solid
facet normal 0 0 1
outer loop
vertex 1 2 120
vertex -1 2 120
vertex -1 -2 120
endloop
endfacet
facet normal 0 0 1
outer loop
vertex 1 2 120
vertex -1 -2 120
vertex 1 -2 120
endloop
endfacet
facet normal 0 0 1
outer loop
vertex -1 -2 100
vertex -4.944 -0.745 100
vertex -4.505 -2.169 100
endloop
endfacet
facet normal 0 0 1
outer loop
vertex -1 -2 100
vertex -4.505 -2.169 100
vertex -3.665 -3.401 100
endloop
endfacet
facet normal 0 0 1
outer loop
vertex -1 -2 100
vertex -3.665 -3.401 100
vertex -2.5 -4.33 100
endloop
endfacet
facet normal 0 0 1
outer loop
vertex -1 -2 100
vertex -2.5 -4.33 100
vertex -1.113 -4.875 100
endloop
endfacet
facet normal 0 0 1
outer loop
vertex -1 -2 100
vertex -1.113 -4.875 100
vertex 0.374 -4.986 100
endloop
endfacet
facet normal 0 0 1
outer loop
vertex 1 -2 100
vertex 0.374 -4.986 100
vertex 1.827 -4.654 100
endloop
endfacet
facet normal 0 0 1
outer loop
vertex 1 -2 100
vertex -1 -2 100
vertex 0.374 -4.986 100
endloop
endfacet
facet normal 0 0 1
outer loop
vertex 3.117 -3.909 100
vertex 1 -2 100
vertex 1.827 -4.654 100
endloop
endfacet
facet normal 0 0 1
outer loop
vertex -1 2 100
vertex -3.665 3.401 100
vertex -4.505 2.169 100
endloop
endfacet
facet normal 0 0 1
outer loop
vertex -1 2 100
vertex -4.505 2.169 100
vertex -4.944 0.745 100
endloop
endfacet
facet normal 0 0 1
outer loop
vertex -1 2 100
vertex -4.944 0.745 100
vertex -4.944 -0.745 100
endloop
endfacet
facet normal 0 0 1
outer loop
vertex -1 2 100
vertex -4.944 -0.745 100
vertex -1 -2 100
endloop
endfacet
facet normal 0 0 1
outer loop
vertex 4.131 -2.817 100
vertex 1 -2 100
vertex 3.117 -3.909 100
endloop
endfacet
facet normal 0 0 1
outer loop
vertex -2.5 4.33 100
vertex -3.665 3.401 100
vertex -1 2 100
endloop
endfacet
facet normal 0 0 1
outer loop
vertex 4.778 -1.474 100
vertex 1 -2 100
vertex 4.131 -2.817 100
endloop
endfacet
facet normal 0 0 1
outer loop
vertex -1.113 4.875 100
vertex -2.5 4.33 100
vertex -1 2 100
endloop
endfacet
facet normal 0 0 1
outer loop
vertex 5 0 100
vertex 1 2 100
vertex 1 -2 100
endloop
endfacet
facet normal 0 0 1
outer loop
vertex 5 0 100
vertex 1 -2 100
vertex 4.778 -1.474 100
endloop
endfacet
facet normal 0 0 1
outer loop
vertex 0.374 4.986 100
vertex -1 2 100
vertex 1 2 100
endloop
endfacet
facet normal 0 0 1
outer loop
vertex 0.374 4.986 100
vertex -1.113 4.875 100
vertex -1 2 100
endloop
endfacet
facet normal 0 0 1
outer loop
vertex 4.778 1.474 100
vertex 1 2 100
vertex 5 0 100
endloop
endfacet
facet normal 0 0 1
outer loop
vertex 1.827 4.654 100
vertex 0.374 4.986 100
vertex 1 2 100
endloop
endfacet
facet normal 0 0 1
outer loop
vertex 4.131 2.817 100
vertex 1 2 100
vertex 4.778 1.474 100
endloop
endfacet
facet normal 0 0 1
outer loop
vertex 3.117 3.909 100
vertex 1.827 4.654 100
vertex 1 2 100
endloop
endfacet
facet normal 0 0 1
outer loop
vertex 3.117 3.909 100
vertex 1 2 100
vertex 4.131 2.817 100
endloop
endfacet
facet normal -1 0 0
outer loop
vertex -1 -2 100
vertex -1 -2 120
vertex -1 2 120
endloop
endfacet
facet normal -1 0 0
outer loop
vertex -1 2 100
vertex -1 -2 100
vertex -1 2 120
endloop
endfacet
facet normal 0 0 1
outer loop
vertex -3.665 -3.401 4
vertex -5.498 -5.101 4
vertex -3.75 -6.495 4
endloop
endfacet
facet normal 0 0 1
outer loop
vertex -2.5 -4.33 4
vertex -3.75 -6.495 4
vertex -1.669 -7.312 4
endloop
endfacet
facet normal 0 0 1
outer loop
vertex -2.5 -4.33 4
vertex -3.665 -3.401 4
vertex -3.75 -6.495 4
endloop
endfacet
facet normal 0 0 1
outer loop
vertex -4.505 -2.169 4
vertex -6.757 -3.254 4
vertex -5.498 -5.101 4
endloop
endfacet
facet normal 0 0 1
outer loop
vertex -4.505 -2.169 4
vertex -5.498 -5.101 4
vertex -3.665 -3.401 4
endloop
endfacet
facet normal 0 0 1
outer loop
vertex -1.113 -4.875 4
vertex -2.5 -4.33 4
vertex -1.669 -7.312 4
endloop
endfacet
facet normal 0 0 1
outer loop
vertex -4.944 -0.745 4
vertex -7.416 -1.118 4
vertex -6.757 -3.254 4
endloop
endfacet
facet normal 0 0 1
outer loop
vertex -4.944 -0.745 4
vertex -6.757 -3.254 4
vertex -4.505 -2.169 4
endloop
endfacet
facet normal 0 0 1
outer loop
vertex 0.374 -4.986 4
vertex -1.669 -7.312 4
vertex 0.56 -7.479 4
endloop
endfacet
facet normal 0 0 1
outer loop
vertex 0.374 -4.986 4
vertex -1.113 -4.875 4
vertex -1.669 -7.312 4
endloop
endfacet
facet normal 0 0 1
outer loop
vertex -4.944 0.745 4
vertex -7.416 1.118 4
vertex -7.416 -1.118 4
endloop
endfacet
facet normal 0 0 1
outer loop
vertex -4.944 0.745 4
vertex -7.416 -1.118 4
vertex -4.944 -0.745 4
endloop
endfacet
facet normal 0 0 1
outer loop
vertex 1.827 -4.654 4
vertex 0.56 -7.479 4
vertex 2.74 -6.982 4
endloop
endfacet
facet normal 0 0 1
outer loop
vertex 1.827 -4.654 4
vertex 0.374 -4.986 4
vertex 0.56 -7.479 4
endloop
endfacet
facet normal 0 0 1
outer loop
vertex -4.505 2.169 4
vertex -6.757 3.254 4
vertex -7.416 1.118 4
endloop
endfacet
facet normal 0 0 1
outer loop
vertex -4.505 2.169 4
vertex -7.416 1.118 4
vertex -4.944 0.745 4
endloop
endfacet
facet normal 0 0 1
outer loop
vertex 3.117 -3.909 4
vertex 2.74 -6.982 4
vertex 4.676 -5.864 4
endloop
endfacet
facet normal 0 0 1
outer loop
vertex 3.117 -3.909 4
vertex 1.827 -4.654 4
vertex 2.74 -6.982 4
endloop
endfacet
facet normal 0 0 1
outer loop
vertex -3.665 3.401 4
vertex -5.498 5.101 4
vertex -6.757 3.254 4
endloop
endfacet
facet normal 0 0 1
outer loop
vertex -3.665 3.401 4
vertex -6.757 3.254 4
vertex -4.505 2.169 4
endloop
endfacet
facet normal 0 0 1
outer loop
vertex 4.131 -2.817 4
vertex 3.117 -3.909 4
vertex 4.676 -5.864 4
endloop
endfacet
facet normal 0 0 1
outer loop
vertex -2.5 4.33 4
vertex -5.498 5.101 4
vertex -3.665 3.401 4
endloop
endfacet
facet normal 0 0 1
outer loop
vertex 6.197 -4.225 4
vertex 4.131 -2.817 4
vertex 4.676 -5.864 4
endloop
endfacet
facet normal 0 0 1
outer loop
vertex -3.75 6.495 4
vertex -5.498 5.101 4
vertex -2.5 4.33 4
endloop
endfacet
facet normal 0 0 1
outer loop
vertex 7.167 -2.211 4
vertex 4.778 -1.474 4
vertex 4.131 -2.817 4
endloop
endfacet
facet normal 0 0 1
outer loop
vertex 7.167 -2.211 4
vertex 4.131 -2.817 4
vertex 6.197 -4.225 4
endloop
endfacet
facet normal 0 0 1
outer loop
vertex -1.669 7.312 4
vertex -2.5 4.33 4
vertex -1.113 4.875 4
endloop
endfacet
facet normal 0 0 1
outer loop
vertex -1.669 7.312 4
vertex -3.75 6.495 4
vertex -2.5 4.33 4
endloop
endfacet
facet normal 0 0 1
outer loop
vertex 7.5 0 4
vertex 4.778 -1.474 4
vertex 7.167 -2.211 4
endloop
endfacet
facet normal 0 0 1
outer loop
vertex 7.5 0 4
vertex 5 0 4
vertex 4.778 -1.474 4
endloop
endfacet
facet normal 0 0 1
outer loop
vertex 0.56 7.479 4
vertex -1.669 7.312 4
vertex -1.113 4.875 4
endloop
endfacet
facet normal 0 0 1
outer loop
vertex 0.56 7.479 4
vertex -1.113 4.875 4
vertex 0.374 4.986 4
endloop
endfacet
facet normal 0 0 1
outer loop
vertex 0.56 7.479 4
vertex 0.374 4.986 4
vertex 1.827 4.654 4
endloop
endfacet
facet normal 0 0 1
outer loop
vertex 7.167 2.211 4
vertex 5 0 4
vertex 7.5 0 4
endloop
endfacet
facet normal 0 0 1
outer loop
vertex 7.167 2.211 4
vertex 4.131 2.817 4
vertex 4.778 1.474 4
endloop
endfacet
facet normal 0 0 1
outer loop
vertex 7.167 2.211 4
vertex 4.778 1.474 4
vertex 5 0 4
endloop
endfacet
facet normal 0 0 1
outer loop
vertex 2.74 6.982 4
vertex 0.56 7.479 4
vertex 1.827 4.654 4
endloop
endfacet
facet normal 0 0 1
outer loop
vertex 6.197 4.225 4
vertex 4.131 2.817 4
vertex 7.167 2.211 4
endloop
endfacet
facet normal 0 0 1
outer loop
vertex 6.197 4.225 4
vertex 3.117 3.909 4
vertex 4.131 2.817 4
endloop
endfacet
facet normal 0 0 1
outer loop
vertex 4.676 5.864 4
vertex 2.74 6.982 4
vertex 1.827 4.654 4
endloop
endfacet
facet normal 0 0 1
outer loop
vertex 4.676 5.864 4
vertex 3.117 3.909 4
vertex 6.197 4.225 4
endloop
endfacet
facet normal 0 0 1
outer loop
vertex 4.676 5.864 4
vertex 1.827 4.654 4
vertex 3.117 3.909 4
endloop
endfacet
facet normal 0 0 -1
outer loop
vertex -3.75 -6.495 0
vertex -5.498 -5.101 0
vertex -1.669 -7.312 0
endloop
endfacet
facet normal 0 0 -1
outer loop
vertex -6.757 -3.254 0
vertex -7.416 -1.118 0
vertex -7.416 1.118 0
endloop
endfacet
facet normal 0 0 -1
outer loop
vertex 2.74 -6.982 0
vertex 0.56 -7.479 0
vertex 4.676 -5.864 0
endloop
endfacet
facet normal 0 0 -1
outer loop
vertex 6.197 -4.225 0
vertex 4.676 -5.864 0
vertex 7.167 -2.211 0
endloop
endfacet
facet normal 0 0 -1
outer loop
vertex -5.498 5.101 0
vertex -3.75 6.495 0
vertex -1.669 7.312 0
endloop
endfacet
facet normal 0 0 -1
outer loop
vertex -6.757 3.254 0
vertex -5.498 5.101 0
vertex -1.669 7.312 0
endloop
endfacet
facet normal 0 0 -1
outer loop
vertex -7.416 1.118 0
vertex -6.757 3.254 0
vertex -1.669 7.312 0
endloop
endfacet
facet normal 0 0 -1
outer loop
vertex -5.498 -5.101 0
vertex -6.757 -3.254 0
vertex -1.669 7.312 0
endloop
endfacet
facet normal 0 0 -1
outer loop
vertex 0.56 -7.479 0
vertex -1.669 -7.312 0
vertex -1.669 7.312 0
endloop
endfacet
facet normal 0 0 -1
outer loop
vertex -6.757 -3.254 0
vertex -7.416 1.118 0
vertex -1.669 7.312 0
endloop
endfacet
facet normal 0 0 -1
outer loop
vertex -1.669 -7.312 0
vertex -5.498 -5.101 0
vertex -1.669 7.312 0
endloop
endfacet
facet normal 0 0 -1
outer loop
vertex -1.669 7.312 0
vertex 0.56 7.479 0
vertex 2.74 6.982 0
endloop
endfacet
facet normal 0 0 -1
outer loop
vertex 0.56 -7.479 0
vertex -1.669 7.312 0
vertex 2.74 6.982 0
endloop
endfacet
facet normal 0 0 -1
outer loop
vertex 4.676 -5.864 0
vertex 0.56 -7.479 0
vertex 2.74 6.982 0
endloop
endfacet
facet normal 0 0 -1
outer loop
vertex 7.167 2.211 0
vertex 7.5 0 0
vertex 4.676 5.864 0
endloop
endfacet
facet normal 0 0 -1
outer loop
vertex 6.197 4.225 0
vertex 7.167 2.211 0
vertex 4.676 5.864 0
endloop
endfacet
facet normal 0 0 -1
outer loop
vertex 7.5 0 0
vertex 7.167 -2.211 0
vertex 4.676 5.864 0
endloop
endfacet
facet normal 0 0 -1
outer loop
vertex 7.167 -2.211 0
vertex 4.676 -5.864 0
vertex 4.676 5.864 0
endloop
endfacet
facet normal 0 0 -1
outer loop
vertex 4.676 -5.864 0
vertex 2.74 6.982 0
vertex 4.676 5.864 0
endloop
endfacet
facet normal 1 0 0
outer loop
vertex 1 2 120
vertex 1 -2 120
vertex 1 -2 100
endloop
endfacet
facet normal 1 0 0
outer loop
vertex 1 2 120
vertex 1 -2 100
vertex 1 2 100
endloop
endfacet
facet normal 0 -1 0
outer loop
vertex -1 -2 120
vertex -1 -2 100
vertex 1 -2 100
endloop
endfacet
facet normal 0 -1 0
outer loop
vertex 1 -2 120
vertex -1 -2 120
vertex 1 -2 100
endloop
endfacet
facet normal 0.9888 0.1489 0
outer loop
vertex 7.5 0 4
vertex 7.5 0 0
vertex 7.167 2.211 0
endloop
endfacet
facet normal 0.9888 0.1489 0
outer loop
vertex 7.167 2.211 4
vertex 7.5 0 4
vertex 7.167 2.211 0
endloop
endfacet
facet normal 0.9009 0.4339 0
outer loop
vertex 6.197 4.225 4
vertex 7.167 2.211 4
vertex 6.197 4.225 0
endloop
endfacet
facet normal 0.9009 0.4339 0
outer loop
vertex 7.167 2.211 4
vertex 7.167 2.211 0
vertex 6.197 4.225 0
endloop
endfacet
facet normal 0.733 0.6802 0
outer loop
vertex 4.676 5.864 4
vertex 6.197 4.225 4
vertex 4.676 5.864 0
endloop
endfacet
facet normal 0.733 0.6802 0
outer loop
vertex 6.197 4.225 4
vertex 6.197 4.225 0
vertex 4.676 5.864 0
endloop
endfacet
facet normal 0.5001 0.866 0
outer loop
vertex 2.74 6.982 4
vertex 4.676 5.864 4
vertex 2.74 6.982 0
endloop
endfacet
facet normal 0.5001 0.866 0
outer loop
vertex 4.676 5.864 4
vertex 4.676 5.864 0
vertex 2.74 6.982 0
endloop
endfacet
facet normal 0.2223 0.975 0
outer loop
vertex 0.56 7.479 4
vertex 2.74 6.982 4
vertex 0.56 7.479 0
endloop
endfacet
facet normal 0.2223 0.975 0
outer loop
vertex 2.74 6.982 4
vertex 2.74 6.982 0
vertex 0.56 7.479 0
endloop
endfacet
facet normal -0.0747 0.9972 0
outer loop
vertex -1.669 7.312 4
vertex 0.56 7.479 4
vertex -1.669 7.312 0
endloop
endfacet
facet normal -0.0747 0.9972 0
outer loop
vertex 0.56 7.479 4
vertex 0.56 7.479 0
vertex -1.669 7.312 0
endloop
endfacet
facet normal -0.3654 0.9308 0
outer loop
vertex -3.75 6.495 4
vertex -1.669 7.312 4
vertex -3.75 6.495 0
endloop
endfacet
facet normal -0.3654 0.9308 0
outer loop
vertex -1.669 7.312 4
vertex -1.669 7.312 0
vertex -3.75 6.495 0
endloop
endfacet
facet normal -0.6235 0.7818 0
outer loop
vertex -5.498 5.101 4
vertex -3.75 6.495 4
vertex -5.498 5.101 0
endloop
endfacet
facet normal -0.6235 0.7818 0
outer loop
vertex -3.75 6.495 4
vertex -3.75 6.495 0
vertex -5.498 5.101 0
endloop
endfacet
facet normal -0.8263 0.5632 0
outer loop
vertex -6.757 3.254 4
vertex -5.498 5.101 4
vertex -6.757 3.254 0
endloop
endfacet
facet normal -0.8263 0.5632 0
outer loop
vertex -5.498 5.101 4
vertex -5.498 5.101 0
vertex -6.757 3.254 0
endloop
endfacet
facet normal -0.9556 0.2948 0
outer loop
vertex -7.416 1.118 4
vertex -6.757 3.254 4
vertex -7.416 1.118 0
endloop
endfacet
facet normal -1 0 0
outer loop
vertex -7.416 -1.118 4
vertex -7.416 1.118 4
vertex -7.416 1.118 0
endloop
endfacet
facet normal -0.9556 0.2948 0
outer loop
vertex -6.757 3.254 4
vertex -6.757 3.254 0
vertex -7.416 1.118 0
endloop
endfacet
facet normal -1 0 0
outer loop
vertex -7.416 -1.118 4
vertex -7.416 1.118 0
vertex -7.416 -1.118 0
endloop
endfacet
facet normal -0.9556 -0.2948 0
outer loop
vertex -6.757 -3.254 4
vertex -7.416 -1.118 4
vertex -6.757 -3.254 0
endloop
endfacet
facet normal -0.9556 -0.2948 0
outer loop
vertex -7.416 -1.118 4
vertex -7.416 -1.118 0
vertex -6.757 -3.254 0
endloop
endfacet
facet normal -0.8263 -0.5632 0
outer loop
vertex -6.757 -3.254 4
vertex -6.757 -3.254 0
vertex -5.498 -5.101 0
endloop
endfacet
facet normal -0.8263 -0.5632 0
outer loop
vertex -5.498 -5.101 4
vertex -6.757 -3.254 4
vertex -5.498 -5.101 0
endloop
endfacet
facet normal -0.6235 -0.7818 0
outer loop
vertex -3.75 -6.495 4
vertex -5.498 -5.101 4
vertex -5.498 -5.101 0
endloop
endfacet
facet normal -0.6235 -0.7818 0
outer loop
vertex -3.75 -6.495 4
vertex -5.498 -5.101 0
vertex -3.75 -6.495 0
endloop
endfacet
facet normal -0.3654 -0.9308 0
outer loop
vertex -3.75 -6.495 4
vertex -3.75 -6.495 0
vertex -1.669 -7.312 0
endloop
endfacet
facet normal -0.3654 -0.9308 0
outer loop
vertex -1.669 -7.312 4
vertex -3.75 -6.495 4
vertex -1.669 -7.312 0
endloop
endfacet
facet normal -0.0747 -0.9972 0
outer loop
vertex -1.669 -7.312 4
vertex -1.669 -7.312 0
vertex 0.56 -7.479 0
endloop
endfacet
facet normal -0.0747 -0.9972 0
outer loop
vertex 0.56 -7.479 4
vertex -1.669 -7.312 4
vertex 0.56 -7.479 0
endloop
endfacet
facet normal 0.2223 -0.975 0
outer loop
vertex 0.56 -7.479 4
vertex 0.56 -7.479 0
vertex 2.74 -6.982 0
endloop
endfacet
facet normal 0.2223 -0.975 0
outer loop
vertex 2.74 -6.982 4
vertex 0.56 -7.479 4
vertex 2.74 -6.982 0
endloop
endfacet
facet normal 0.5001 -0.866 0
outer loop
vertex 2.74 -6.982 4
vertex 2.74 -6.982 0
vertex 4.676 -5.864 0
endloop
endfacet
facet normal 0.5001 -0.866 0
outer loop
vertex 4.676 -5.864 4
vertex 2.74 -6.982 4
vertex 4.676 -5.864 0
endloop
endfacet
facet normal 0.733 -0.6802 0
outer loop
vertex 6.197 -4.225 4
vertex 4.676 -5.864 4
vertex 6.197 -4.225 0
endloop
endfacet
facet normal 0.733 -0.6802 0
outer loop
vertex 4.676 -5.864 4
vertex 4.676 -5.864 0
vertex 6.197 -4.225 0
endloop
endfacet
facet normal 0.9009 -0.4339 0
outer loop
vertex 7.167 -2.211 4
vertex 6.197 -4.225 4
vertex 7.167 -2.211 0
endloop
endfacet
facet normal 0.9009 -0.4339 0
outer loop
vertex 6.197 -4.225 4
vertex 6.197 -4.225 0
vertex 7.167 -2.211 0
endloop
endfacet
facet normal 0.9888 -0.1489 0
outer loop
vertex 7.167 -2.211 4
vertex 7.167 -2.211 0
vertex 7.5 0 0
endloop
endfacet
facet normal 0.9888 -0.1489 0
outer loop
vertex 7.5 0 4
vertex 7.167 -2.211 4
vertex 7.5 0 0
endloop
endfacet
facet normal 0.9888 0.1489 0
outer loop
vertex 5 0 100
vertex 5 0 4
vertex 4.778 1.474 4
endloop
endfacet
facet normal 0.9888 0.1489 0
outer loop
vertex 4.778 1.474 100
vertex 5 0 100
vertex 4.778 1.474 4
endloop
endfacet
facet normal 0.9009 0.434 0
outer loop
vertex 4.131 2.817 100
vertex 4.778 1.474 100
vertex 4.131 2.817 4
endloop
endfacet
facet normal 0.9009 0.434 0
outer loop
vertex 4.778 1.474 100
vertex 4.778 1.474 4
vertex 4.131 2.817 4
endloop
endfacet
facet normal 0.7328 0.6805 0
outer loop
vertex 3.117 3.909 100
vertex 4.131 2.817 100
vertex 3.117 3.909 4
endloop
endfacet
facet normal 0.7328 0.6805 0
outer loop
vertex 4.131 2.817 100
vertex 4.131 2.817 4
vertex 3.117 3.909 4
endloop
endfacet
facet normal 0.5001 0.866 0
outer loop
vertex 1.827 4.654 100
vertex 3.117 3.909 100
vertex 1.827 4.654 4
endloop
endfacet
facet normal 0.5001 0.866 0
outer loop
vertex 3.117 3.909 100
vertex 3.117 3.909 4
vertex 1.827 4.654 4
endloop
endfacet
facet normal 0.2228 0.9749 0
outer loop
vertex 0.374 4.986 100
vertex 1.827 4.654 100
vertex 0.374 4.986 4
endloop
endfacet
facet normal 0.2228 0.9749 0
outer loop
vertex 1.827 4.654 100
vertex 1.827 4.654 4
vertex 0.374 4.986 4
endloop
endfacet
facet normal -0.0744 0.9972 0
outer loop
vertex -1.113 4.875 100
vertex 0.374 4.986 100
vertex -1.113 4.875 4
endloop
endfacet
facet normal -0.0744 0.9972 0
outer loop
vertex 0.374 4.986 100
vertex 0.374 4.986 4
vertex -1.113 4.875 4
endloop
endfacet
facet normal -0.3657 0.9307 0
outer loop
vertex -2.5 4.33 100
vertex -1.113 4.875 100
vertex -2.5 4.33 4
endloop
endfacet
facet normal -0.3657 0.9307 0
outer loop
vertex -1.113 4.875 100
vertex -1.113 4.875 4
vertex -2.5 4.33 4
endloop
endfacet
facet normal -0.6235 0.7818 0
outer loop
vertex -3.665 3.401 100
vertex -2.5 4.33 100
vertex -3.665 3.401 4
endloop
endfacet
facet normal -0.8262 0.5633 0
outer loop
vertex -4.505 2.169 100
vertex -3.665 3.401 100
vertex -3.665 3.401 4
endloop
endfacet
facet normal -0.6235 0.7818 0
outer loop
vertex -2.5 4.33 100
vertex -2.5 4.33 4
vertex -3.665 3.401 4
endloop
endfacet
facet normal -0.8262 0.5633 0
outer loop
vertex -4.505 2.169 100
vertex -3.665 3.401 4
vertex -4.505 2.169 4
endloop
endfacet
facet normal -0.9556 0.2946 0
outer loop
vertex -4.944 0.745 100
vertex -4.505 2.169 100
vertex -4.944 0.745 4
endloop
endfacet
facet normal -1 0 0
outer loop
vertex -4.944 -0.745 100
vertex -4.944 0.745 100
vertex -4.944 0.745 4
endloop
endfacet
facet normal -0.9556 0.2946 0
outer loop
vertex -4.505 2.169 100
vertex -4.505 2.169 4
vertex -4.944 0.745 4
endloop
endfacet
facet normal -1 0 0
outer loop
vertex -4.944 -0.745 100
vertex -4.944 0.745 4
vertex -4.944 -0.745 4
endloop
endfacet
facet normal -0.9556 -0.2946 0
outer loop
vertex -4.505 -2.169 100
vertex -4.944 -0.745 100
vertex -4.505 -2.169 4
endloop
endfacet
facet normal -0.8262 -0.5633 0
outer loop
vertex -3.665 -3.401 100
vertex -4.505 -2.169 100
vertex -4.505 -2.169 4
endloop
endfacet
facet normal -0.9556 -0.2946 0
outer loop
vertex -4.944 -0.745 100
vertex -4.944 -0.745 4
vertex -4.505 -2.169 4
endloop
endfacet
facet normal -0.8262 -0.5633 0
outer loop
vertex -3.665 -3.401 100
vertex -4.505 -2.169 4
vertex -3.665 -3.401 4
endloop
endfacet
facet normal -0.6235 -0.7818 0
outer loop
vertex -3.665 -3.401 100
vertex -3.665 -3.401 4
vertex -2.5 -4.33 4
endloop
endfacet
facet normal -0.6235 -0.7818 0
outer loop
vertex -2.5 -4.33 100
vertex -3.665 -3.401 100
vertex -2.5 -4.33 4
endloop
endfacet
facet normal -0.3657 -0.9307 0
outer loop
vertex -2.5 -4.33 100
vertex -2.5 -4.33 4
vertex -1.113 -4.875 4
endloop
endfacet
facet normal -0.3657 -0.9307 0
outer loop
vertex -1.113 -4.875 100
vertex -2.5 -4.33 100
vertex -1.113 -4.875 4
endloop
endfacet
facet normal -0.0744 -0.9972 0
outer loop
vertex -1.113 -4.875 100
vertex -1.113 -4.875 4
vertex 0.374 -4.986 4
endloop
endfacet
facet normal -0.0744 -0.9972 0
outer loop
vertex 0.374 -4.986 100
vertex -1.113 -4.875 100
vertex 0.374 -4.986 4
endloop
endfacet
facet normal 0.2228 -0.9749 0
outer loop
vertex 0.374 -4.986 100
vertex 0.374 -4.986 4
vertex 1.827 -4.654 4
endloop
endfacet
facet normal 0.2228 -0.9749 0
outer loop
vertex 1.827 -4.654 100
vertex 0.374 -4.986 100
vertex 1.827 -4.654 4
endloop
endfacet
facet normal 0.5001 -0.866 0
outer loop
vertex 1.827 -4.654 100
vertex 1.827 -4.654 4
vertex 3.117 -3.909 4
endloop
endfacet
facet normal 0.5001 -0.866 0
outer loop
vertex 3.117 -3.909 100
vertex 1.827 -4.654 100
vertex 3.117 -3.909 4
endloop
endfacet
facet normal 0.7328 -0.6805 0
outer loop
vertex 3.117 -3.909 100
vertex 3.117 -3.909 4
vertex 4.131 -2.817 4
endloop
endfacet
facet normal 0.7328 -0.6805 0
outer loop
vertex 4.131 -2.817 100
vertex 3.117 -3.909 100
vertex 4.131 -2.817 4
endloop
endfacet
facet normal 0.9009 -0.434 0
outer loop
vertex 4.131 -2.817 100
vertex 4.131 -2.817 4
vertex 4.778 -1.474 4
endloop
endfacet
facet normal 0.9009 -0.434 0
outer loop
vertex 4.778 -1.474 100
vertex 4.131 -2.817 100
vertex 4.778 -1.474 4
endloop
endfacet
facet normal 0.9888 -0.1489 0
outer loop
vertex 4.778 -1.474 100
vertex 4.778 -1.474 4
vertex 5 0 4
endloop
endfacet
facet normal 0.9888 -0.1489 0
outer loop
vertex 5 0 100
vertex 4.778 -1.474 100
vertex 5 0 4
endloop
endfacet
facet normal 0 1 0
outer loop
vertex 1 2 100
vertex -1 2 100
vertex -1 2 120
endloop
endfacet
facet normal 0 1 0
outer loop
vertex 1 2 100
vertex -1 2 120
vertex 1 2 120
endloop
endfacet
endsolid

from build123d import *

# Parameters (mm, degrees)
F0_R     = 7.5
F1_DEPTH = 4
F2_R     = 5
F3_DEPTH = 100
F4_W     = 2
F4_H     = 4
F5_DEPTH = 20


with BuildPart() as f1:
    # F0 (on Top) → F1 (new body)
    with BuildSketch(Plane.XY):
        Circle(F0_R)
    extrude(amount=F1_DEPTH)

    # F2 (on Top) → F3 (join)
    with BuildSketch(Plane.XY):
        Circle(F2_R)
    extrude(amount=F3_DEPTH)

    # F4 (on face) → F5 (join)
    with BuildSketch(Plane.XY.offset(100)):
        Rectangle(F4_W, F4_H)
    extrude(amount=F5_DEPTH)


solid = f1.part
